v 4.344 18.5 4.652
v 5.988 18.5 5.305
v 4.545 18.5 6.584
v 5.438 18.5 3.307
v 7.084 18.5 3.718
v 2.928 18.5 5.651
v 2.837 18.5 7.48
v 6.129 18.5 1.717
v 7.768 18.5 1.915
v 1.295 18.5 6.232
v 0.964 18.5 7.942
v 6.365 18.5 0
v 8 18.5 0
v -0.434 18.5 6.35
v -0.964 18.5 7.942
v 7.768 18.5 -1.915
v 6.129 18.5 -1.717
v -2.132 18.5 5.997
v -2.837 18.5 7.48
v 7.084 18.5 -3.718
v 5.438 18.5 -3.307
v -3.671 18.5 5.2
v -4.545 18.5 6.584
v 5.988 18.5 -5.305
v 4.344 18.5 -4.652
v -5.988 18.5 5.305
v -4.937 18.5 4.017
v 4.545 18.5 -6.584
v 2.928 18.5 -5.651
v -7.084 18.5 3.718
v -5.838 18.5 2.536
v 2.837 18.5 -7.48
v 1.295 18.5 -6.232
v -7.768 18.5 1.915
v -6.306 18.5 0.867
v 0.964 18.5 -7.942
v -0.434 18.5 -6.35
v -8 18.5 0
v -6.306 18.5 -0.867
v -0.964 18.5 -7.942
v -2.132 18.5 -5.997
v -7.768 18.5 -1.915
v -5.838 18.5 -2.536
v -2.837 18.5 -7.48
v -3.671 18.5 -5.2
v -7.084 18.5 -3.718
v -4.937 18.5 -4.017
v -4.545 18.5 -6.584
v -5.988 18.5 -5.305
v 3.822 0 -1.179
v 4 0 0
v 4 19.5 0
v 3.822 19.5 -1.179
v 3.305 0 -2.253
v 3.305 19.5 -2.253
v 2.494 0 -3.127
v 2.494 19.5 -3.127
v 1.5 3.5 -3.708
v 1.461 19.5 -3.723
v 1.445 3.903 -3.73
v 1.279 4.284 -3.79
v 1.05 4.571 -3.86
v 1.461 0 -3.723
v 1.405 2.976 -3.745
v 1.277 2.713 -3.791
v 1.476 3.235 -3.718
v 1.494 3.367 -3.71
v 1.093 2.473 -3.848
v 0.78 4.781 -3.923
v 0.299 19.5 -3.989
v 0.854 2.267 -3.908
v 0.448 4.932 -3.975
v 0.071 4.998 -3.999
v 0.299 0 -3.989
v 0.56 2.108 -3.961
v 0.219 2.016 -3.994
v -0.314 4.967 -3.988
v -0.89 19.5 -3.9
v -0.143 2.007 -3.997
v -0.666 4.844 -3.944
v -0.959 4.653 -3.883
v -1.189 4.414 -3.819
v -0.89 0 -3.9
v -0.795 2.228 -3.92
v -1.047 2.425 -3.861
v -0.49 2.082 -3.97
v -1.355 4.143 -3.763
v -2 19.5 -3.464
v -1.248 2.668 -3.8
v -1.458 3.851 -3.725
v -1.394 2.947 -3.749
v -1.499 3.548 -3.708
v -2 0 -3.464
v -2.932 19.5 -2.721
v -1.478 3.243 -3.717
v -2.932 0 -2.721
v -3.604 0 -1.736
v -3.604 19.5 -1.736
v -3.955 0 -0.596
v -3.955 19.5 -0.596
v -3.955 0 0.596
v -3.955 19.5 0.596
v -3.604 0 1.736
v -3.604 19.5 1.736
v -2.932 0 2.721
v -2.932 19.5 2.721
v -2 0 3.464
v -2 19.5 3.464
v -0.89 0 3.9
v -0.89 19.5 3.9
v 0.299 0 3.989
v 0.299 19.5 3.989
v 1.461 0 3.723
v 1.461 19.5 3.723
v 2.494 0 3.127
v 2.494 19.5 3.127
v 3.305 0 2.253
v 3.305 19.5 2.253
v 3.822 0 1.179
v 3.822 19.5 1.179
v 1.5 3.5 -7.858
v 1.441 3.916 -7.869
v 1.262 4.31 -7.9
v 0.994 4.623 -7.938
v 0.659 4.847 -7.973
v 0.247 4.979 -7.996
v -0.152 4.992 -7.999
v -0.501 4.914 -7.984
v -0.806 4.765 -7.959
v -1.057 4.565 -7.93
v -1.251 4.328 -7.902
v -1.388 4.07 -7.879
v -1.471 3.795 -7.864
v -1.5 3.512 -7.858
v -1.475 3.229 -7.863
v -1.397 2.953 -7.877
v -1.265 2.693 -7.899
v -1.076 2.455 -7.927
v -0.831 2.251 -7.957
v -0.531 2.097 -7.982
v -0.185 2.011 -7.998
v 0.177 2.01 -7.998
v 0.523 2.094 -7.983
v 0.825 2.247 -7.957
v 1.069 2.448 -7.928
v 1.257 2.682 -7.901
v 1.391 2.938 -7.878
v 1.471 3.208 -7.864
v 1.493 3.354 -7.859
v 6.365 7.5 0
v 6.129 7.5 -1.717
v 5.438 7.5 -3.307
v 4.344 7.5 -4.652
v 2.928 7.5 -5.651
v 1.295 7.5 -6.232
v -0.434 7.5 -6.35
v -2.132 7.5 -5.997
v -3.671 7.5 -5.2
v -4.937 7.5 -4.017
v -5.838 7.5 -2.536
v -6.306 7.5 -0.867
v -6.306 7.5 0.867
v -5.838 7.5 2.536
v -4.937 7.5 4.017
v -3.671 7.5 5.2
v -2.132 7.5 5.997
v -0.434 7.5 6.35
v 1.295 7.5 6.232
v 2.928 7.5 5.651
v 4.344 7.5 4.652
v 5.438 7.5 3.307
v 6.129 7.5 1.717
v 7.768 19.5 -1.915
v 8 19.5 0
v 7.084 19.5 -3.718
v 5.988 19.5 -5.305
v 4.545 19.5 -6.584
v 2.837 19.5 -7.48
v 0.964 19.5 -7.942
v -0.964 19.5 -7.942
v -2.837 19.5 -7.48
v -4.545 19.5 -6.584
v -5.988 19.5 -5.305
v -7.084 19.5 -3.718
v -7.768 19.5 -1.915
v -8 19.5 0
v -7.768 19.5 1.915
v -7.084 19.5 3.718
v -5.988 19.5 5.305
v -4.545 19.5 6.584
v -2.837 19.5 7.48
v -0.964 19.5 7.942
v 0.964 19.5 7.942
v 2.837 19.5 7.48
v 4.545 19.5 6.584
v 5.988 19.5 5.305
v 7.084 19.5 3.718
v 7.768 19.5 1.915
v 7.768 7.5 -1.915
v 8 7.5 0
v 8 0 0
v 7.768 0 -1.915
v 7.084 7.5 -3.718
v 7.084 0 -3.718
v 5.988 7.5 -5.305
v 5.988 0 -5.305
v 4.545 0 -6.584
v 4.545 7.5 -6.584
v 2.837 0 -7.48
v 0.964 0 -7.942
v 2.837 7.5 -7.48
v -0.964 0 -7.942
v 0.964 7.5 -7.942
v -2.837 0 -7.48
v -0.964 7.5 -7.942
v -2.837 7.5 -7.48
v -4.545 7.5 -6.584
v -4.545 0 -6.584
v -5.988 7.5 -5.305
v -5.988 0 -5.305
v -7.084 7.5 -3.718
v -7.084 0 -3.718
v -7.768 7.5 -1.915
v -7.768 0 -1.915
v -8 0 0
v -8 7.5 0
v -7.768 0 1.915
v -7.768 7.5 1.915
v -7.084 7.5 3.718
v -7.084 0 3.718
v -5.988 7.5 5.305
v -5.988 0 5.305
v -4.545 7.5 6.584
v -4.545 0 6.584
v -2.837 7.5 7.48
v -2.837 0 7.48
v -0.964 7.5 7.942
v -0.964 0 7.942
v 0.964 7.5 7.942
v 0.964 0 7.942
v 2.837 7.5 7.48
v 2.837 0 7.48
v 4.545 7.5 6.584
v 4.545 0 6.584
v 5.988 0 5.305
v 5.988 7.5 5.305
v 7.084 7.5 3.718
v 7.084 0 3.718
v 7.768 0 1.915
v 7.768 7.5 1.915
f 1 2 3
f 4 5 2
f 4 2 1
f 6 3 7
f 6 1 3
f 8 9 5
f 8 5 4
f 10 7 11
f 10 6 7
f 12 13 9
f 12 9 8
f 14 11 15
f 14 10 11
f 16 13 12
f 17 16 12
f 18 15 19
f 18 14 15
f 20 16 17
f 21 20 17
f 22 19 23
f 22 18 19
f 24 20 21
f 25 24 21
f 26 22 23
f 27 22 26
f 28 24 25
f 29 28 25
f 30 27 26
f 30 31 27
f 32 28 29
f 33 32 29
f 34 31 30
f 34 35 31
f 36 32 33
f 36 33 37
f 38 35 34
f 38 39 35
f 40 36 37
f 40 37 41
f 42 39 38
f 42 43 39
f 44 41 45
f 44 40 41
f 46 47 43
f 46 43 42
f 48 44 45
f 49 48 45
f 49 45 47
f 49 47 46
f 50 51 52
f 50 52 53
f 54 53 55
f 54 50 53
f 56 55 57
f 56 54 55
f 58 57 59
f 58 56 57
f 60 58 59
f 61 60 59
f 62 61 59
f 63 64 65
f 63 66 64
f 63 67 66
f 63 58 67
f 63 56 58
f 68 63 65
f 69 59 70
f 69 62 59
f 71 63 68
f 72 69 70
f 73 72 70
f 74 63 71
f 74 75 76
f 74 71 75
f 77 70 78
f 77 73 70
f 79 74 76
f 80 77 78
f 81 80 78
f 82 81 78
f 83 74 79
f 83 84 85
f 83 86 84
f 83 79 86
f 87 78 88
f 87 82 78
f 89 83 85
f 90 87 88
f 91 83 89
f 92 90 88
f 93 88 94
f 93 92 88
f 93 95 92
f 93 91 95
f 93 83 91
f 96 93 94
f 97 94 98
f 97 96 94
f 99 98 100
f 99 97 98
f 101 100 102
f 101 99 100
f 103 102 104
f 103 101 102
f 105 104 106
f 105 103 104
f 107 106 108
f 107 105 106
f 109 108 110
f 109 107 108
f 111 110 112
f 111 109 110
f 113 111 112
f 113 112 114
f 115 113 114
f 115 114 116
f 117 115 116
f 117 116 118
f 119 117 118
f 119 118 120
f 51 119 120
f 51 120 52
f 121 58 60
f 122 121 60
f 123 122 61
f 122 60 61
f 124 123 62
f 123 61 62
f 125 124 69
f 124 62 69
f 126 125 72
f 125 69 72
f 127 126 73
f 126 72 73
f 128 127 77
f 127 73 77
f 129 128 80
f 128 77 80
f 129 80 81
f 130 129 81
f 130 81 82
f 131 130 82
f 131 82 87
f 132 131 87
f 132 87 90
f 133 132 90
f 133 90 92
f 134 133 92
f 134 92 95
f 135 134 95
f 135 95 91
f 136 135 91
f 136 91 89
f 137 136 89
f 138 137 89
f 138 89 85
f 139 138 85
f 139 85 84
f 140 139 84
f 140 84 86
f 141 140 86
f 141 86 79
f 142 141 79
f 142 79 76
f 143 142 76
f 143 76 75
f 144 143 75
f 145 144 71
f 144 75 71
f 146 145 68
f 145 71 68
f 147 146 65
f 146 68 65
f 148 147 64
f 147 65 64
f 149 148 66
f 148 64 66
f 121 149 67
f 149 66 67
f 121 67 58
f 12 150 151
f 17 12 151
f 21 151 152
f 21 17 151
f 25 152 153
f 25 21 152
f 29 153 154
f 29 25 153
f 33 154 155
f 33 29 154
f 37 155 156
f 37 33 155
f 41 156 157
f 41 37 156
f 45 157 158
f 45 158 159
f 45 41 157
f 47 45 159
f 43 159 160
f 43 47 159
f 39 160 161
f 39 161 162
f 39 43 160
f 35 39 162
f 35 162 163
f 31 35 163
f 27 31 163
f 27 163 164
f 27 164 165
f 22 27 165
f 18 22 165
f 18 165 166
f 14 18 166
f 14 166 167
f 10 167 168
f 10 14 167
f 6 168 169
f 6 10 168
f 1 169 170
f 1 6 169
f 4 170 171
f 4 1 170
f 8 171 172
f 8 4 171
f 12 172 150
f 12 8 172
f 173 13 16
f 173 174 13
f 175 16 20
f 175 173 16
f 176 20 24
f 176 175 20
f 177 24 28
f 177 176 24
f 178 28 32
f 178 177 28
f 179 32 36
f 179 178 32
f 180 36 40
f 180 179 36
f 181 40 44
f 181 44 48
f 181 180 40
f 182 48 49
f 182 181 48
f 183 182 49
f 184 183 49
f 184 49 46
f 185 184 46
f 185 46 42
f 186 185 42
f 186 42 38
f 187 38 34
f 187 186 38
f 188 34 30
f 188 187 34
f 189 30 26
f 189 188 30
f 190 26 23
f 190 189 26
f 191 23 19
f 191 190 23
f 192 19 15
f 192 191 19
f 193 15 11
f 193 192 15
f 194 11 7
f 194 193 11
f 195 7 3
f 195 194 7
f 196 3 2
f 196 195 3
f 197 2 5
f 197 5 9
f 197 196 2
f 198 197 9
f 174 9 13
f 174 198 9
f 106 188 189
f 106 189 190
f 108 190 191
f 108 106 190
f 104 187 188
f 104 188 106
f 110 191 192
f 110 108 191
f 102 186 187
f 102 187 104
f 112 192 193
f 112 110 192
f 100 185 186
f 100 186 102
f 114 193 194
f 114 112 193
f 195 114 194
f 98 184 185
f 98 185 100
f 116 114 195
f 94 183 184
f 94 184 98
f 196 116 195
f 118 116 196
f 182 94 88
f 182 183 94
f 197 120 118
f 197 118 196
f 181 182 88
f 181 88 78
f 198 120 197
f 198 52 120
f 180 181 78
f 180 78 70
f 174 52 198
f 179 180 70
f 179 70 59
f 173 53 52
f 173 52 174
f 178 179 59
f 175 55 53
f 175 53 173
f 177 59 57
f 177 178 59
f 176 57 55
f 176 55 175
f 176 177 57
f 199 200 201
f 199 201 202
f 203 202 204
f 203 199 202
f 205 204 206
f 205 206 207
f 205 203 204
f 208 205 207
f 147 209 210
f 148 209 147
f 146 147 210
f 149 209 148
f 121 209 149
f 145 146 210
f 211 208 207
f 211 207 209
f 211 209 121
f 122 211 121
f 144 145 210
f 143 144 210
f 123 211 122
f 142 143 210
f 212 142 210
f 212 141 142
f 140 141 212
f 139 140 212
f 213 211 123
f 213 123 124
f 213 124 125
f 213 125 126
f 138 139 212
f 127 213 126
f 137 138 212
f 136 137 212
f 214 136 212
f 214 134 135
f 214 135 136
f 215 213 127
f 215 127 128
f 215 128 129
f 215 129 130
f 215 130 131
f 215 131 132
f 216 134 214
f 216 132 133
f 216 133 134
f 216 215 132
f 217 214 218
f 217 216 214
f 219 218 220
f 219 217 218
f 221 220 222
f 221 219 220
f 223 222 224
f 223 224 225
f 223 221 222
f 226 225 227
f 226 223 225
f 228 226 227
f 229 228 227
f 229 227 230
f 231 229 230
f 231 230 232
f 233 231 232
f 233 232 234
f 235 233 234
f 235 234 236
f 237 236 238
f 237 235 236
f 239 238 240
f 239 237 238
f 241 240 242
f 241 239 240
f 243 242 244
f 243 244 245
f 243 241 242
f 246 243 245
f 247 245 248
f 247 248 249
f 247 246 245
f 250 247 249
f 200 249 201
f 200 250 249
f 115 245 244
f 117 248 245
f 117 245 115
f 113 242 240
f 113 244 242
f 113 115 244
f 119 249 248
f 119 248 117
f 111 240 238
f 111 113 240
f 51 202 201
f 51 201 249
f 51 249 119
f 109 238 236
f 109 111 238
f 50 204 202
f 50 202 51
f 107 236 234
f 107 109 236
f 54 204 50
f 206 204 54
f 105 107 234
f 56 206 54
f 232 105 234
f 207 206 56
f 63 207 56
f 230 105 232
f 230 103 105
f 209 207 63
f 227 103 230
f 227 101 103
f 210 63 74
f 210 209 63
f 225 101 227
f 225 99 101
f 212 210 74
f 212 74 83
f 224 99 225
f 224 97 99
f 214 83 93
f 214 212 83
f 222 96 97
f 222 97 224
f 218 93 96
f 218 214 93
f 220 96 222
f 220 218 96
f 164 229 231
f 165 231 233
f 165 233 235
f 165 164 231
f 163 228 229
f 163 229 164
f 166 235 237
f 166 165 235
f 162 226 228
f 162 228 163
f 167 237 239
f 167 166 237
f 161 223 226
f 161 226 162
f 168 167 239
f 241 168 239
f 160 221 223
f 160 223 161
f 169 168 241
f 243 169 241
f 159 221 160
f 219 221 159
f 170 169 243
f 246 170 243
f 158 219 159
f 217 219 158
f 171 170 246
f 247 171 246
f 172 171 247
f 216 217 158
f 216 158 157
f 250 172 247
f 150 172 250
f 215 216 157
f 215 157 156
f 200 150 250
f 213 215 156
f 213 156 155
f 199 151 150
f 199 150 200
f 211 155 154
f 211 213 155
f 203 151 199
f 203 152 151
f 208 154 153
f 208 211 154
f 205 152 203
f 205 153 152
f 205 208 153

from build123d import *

# Parameters (mm, degrees)
SKETCH_2_R          = 1.5
CUT_EXTRUDE_1_DEPTH = 10


with BuildPart() as part:
    # Эскиз1 → Повернуть1 (revolve)
    with BuildSketch(Plane.XY):
        Polygon((8, 19.5), (4, 19.5), (4, 0), (8, 0), (8, 7.5), (6.365, 7.5), (6.365, 18.5), (8, 18.5), align=None)
    revolve(axis=Axis((0, -1000, 0), (0, 1, 0)))

    # Эскиз2 → Вырез-Вытянуть1 (cut)
    with BuildSketch(Plane.XY):
        with Locations((0, 3.5)):
            Circle(SKETCH_2_R)
    extrude(amount=-CUT_EXTRUDE_1_DEPTH, mode=Mode.SUBTRACT)


solid = part.part
